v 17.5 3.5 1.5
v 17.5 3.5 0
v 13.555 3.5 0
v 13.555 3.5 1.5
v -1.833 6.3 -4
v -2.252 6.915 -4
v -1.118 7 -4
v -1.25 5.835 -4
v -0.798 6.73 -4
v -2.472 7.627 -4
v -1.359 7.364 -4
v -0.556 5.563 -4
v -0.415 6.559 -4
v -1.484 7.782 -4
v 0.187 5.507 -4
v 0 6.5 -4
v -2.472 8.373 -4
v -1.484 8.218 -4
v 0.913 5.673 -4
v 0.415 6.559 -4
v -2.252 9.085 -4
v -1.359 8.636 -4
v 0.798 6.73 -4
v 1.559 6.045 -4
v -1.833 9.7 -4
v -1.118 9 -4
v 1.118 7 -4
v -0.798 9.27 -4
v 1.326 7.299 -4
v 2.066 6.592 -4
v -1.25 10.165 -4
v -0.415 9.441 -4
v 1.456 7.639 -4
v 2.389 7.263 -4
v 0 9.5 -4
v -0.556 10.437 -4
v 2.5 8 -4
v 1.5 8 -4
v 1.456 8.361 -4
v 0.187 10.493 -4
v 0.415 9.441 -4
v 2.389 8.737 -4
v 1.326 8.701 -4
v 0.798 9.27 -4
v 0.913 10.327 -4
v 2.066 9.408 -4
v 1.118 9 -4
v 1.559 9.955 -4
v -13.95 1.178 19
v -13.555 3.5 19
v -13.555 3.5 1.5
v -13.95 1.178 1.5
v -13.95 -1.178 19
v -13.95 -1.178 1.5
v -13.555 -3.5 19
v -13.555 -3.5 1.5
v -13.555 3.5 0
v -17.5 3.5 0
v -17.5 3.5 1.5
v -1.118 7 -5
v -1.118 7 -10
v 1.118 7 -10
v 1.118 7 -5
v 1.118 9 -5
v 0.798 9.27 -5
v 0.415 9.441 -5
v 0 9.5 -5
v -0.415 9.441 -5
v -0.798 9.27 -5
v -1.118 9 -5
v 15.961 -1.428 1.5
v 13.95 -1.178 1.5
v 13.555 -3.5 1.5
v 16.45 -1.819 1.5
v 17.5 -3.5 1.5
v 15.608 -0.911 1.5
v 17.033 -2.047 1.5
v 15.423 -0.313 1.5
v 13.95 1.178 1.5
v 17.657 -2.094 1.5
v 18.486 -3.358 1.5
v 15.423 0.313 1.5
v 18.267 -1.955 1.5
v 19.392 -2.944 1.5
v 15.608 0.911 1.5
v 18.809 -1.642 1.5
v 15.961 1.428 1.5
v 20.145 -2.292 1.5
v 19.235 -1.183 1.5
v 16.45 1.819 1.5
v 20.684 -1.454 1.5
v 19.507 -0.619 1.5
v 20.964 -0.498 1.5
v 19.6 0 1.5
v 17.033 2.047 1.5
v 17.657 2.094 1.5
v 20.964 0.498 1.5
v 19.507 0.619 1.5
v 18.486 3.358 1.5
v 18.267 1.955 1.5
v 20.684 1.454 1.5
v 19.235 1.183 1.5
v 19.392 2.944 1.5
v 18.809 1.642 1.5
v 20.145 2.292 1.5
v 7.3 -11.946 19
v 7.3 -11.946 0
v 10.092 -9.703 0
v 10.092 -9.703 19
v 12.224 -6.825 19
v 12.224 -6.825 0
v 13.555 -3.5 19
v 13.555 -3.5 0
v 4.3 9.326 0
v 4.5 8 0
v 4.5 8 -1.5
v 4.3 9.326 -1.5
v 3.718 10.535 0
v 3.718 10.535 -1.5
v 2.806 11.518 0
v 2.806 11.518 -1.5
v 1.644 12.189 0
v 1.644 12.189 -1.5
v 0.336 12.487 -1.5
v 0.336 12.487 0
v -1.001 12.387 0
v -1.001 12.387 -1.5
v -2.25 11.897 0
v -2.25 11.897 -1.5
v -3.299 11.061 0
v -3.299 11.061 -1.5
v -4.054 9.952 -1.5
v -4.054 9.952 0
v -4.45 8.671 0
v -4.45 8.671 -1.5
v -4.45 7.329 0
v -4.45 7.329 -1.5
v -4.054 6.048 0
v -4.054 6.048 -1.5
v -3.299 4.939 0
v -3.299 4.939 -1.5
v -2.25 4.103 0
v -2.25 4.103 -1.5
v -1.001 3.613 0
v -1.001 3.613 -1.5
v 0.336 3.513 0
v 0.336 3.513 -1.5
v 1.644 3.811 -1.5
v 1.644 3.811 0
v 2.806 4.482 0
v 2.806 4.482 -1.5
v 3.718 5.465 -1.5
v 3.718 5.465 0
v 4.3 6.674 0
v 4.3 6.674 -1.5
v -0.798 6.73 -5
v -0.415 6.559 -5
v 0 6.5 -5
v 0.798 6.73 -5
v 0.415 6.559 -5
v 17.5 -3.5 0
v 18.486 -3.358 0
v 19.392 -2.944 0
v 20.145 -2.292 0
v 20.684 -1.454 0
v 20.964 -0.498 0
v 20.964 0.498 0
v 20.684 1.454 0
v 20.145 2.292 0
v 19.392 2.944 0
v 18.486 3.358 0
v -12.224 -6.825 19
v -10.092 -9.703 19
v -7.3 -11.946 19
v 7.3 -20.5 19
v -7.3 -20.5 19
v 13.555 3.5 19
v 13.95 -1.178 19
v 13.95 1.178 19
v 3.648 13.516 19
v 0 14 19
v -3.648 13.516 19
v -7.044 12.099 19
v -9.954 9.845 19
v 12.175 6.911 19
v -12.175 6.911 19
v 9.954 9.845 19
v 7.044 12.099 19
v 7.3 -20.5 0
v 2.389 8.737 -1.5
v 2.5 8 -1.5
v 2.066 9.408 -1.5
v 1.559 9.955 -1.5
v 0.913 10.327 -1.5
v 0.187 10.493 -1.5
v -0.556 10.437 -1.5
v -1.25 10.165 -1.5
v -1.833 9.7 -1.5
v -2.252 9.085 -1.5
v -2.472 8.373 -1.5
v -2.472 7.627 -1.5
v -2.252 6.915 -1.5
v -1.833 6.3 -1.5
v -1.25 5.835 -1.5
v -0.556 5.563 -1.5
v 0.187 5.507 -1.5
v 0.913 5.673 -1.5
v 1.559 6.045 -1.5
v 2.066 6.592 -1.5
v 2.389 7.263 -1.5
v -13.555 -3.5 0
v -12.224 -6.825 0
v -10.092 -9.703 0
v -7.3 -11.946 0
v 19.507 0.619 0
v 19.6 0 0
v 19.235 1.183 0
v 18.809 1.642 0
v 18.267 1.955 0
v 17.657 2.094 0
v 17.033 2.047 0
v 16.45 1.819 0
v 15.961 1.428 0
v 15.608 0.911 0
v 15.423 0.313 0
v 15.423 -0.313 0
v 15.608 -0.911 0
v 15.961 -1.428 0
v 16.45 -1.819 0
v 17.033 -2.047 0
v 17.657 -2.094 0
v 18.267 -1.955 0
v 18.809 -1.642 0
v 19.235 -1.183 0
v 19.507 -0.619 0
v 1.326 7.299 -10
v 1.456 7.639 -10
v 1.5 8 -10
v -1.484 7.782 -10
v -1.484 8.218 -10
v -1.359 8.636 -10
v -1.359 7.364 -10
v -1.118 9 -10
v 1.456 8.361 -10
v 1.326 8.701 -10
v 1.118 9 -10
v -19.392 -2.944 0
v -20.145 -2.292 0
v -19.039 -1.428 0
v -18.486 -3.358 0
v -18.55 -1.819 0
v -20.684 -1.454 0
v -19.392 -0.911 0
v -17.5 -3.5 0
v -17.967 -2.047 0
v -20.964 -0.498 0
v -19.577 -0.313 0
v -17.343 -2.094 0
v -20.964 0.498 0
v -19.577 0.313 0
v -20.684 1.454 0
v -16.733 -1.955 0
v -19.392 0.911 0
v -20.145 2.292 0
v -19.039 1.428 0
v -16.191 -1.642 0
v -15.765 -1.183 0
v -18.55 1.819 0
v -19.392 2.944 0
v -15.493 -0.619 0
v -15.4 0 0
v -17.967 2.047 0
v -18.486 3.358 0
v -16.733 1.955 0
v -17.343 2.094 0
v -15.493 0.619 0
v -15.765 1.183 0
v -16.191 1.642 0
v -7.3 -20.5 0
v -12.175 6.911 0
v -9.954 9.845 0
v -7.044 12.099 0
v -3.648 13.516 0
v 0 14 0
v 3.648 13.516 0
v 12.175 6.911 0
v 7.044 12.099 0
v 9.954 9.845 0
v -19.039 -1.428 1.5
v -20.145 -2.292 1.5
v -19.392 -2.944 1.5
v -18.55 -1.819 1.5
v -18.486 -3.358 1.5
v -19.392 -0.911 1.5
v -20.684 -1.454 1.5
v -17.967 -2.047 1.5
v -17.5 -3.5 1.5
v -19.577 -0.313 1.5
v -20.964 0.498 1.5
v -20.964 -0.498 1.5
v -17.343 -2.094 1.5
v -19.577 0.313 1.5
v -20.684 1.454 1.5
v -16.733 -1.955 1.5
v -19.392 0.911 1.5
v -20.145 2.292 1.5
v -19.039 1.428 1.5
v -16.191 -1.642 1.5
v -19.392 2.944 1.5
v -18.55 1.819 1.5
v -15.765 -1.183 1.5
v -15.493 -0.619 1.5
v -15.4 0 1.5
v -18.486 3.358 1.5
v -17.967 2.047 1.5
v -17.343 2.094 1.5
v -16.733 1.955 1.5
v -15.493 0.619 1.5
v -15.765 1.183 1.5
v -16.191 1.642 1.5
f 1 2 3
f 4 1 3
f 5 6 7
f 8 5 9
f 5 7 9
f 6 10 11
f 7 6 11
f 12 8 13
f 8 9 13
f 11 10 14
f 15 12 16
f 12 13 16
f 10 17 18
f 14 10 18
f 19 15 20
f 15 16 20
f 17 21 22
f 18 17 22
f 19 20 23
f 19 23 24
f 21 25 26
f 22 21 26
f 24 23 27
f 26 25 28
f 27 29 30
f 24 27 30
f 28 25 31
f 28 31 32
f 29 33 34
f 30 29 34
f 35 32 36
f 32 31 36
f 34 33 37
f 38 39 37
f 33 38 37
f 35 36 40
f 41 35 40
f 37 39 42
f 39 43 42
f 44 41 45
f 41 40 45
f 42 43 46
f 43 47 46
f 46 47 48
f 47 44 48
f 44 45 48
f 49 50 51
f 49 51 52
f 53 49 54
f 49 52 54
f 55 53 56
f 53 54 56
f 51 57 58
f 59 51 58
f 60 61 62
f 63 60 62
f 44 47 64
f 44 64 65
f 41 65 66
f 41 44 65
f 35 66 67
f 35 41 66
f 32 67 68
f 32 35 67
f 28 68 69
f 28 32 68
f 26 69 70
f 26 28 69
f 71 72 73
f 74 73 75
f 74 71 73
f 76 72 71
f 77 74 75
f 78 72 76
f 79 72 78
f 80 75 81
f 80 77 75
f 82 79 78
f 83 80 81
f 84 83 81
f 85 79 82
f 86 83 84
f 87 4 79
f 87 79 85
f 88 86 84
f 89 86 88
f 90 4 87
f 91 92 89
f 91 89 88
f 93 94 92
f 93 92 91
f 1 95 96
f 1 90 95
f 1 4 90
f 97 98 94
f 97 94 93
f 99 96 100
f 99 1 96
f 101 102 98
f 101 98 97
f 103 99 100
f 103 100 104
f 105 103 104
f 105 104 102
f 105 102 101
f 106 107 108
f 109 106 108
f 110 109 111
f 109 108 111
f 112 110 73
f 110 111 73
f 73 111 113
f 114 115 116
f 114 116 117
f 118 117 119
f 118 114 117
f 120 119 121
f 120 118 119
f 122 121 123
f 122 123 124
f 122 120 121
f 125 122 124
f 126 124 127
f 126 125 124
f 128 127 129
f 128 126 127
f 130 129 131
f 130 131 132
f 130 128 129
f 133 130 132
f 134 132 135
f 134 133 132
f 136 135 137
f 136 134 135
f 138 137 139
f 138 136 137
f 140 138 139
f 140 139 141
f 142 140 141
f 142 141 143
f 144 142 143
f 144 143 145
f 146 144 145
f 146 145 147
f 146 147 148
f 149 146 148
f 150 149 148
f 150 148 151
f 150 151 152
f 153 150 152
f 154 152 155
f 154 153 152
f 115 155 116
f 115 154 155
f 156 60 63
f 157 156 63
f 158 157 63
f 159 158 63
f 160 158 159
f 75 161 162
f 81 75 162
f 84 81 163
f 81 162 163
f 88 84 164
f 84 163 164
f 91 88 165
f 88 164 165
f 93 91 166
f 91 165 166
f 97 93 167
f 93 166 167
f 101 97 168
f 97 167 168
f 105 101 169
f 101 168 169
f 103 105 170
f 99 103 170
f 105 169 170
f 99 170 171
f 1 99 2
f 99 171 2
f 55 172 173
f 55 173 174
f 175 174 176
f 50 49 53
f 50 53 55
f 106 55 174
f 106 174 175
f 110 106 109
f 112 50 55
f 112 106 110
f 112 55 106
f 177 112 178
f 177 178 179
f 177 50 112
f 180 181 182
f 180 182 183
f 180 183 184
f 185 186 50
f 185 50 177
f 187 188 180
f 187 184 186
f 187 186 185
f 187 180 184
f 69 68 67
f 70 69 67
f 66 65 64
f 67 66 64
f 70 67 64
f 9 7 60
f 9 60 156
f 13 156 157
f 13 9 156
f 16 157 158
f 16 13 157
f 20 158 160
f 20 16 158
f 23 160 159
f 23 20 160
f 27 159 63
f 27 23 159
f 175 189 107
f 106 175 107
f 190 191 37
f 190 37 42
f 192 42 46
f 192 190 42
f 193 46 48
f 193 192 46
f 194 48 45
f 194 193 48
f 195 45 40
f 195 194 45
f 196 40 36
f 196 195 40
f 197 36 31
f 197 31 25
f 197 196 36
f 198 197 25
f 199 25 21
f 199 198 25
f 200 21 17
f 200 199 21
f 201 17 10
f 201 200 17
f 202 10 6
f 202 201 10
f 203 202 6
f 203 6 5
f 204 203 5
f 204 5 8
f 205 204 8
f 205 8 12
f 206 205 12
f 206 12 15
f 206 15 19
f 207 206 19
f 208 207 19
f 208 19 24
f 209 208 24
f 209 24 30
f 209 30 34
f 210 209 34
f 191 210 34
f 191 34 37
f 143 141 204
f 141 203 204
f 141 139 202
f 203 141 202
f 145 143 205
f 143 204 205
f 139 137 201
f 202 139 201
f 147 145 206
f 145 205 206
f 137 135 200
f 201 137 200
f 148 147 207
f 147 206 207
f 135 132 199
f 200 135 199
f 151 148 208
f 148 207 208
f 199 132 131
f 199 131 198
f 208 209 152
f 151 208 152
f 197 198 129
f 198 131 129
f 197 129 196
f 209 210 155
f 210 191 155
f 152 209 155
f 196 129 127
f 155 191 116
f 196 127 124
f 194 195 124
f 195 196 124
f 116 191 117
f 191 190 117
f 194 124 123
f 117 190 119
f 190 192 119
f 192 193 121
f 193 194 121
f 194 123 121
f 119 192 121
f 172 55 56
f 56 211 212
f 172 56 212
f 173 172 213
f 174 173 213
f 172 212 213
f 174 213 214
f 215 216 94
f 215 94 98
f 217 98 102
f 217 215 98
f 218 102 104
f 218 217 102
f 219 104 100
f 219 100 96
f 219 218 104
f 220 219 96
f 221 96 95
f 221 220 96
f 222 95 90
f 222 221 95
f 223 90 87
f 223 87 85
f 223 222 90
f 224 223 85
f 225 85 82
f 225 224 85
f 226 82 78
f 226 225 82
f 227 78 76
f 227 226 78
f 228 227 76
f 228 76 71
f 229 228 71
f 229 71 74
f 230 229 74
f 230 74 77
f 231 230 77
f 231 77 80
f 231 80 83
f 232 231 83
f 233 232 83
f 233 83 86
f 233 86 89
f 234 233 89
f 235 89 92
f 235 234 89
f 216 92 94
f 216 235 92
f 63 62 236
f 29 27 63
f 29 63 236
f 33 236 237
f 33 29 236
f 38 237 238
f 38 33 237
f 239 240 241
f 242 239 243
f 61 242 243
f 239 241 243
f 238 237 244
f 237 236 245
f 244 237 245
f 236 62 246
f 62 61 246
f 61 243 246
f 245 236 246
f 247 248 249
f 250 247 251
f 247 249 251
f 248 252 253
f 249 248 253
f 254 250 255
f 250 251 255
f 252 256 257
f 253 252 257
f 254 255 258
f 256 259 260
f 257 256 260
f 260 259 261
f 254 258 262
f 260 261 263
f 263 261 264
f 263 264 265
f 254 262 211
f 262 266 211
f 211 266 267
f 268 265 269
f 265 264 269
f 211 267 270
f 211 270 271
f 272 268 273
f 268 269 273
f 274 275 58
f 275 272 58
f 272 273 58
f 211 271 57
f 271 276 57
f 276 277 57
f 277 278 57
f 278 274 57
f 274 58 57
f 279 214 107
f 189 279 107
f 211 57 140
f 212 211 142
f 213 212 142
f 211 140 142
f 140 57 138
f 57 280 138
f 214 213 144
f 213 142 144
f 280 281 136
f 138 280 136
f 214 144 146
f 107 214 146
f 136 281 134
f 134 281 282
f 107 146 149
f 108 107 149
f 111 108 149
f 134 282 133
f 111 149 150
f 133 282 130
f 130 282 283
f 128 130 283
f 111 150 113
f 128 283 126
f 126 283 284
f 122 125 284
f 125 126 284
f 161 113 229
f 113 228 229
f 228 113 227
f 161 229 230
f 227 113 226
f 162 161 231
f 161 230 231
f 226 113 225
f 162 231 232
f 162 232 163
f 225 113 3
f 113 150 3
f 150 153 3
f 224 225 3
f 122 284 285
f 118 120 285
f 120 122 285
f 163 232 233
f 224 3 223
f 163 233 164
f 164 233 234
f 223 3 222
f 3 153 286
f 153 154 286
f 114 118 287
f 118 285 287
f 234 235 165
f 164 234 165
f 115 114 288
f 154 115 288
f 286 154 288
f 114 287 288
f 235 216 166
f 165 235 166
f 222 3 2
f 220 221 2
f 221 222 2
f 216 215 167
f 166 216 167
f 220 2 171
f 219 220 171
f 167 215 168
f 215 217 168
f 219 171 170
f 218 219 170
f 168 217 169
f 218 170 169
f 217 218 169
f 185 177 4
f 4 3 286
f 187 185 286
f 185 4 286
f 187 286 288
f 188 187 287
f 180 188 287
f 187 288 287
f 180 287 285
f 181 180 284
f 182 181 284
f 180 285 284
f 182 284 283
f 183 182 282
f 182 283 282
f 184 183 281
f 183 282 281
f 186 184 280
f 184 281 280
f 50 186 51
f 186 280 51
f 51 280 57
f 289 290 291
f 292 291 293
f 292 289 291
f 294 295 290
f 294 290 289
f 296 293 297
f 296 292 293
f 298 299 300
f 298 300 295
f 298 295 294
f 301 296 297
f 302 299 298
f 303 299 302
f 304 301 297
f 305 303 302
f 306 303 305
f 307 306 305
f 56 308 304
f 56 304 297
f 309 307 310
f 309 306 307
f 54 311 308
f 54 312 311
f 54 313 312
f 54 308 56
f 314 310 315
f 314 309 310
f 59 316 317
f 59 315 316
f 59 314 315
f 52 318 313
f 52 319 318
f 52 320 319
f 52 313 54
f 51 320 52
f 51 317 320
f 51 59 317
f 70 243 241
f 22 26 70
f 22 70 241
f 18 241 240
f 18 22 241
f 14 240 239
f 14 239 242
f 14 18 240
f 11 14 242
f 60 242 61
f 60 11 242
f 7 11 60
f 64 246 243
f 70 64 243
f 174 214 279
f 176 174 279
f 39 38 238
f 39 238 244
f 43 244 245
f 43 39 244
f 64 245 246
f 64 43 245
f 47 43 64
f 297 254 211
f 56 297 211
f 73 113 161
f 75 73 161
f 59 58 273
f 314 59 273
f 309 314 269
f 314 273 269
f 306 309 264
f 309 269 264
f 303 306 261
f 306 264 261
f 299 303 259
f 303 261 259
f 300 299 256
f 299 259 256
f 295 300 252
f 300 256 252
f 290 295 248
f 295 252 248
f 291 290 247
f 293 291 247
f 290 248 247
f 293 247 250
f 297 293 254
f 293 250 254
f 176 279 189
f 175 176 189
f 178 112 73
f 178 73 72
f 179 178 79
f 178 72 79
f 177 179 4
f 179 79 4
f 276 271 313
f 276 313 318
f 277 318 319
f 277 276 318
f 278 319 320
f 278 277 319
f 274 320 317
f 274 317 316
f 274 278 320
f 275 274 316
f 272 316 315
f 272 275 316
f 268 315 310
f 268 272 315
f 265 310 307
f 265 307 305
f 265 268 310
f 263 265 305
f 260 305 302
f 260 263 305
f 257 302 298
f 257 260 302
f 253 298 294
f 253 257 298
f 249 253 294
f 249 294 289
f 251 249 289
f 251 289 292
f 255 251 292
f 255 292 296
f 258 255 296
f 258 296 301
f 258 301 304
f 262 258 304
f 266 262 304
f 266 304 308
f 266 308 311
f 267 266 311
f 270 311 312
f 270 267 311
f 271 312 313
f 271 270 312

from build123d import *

# Parameters (mm, degrees)
F0_R          = 4.5
F1_DEPTH      = 19
F0_R_2        = 2.1
F2_DEPTH      = 1.5
F0_R_3        = 2.5
F3_DEPTH      = 1.5
F3_DEPTH_BACK = 19
F4_DEPTH      = 4
F4_DEPTH_BACK = 19
F5_DEPTH      = 10
F5_DEPTH_BACK = 19
F6_DEPTH      = 19
F6_DEPTH_BACK = 5


with BuildPart() as f1:
    # F0 (on Top) → F1 (new body)
    with BuildSketch(Plane.XY):
        with BuildLine():
            ThreePointArc((13.5554417117, 3.5), (0, 14), (-13.5554417117, 3.5))
            ThreePointArc((-13.5554417117, 3.5), (-14, 0), (-13.5554417117, -3.5))
            ThreePointArc((-13.5554417117, -3.5), (-11.250406053, -8.3323684294), (-7.3, -11.9461290802))
            Line((-7.3, -11.9461290802), (-7.3, -20.5))
            Line((-7.3, -20.5), (7.3, -20.5))
            Line((7.3, -20.5), (7.3, -11.9461290802))
            ThreePointArc((7.3, -11.9461290802), (11.250406053, -8.3323684294), (13.5554417117, -3.5))
            ThreePointArc((13.5554417117, -3.5), (14, 0), (13.5554417117, 3.5))
        make_face()
        with Locations((0, 8)):
            Circle(F0_R, mode=Mode.SUBTRACT)
    extrude(amount=F1_DEPTH)

    # F0 (on Top) → F2 (join)
    with BuildSketch(Plane.XY):
        with BuildLine():
            Line((-13.5554417117, 3.5), (-17.5, 3.5))
            ThreePointArc((-17.5, 3.5), (-21, 0), (-17.5, -3.5))
            Line((-17.5, -3.5), (-13.5554417117, -3.5))
            ThreePointArc((-13.5554417117, -3.5), (-14, 0), (-13.5554417117, 3.5))
        make_face()
        with Locations((-17.5, 0)):
            Circle(F0_R_2, mode=Mode.SUBTRACT)
        with BuildLine():
            Line((17.5, 3.5), (13.5554417117, 3.5))
            ThreePointArc((13.5554417117, 3.5), (14, 0), (13.5554417117, -3.5))
            Line((13.5554417117, -3.5), (17.5, -3.5))
            ThreePointArc((17.5, -3.5), (21, 0), (17.5, 3.5))
        make_face()
        with Locations((17.5, 0)):
            Circle(F0_R_2, mode=Mode.SUBTRACT)
    extrude(amount=F2_DEPTH)

    # F0 (on Top) → F3 (join, two sides)
    with BuildSketch(Plane.XY) as f3_sk:
        with Locations((0, 8)):
            Circle(F0_R)
        with Locations((0, 8)):
            Circle(F0_R_3, mode=Mode.SUBTRACT)
    extrude(amount=-F3_DEPTH)
    extrude(f3_sk.sketch, amount=F3_DEPTH_BACK)

    # F0 (on Top) → F4 (join, two sides)
    with BuildSketch(Plane.XY) as f4_sk:
        with Locations((0, 8)):
            Circle(F0_R_3)
        with BuildLine():
            ThreePointArc((1.1180339887, 9), (1.4012585384, 8.5352331347), (1.5, 8))
            ThreePointArc((1.5, 8), (1.4012585384, 7.4647668653), (1.1180339887, 7))
            ThreePointArc((1.1180339887, 7), (0, 6.5), (-1.1180339887, 7))
            ThreePointArc((-1.1180339887, 7), (-1.5, 8), (-1.1180339887, 9))
            ThreePointArc((-1.1180339887, 9), (0, 9.5), (1.1180339887, 9))
        make_face(mode=Mode.SUBTRACT)
    extrude(amount=-F4_DEPTH)
    extrude(f4_sk.sketch, amount=F4_DEPTH_BACK)

    # F0 (on Top) → F5 (join, two sides)
    with BuildSketch(Plane.XY) as f5_sk:
        with BuildLine():
            ThreePointArc((1.1180339887, 7), (1.4012585384, 7.4647668653), (1.5, 8))
            ThreePointArc((1.5, 8), (1.4012585384, 8.5352331347), (1.1180339887, 9))
            Line((1.1180339887, 9), (-1.1180339887, 9))
            ThreePointArc((-1.1180339887, 9), (-1.5, 8), (-1.1180339887, 7))
            Line((-1.1180339887, 7), (1.1180339887, 7))
        make_face()
    extrude(amount=-F5_DEPTH)
    extrude(f5_sk.sketch, amount=F5_DEPTH_BACK)

    # F0 (on Top) → F6 (join, two sides)
    with BuildSketch(Plane.XY) as f6_sk:
        with BuildLine():
            ThreePointArc((-1.1180339887, 7), (0, 6.5), (1.1180339887, 7))
            Line((1.1180339887, 7), (-1.1180339887, 7))
        make_face()
        with BuildLine():
            Line((-1.1180339887, 9), (1.1180339887, 9))
            ThreePointArc((1.1180339887, 9), (0, 9.5), (-1.1180339887, 9))
        make_face()
    extrude(amount=F6_DEPTH)
    extrude(f6_sk.sketch, amount=-F6_DEPTH_BACK)


solid = f1.part
